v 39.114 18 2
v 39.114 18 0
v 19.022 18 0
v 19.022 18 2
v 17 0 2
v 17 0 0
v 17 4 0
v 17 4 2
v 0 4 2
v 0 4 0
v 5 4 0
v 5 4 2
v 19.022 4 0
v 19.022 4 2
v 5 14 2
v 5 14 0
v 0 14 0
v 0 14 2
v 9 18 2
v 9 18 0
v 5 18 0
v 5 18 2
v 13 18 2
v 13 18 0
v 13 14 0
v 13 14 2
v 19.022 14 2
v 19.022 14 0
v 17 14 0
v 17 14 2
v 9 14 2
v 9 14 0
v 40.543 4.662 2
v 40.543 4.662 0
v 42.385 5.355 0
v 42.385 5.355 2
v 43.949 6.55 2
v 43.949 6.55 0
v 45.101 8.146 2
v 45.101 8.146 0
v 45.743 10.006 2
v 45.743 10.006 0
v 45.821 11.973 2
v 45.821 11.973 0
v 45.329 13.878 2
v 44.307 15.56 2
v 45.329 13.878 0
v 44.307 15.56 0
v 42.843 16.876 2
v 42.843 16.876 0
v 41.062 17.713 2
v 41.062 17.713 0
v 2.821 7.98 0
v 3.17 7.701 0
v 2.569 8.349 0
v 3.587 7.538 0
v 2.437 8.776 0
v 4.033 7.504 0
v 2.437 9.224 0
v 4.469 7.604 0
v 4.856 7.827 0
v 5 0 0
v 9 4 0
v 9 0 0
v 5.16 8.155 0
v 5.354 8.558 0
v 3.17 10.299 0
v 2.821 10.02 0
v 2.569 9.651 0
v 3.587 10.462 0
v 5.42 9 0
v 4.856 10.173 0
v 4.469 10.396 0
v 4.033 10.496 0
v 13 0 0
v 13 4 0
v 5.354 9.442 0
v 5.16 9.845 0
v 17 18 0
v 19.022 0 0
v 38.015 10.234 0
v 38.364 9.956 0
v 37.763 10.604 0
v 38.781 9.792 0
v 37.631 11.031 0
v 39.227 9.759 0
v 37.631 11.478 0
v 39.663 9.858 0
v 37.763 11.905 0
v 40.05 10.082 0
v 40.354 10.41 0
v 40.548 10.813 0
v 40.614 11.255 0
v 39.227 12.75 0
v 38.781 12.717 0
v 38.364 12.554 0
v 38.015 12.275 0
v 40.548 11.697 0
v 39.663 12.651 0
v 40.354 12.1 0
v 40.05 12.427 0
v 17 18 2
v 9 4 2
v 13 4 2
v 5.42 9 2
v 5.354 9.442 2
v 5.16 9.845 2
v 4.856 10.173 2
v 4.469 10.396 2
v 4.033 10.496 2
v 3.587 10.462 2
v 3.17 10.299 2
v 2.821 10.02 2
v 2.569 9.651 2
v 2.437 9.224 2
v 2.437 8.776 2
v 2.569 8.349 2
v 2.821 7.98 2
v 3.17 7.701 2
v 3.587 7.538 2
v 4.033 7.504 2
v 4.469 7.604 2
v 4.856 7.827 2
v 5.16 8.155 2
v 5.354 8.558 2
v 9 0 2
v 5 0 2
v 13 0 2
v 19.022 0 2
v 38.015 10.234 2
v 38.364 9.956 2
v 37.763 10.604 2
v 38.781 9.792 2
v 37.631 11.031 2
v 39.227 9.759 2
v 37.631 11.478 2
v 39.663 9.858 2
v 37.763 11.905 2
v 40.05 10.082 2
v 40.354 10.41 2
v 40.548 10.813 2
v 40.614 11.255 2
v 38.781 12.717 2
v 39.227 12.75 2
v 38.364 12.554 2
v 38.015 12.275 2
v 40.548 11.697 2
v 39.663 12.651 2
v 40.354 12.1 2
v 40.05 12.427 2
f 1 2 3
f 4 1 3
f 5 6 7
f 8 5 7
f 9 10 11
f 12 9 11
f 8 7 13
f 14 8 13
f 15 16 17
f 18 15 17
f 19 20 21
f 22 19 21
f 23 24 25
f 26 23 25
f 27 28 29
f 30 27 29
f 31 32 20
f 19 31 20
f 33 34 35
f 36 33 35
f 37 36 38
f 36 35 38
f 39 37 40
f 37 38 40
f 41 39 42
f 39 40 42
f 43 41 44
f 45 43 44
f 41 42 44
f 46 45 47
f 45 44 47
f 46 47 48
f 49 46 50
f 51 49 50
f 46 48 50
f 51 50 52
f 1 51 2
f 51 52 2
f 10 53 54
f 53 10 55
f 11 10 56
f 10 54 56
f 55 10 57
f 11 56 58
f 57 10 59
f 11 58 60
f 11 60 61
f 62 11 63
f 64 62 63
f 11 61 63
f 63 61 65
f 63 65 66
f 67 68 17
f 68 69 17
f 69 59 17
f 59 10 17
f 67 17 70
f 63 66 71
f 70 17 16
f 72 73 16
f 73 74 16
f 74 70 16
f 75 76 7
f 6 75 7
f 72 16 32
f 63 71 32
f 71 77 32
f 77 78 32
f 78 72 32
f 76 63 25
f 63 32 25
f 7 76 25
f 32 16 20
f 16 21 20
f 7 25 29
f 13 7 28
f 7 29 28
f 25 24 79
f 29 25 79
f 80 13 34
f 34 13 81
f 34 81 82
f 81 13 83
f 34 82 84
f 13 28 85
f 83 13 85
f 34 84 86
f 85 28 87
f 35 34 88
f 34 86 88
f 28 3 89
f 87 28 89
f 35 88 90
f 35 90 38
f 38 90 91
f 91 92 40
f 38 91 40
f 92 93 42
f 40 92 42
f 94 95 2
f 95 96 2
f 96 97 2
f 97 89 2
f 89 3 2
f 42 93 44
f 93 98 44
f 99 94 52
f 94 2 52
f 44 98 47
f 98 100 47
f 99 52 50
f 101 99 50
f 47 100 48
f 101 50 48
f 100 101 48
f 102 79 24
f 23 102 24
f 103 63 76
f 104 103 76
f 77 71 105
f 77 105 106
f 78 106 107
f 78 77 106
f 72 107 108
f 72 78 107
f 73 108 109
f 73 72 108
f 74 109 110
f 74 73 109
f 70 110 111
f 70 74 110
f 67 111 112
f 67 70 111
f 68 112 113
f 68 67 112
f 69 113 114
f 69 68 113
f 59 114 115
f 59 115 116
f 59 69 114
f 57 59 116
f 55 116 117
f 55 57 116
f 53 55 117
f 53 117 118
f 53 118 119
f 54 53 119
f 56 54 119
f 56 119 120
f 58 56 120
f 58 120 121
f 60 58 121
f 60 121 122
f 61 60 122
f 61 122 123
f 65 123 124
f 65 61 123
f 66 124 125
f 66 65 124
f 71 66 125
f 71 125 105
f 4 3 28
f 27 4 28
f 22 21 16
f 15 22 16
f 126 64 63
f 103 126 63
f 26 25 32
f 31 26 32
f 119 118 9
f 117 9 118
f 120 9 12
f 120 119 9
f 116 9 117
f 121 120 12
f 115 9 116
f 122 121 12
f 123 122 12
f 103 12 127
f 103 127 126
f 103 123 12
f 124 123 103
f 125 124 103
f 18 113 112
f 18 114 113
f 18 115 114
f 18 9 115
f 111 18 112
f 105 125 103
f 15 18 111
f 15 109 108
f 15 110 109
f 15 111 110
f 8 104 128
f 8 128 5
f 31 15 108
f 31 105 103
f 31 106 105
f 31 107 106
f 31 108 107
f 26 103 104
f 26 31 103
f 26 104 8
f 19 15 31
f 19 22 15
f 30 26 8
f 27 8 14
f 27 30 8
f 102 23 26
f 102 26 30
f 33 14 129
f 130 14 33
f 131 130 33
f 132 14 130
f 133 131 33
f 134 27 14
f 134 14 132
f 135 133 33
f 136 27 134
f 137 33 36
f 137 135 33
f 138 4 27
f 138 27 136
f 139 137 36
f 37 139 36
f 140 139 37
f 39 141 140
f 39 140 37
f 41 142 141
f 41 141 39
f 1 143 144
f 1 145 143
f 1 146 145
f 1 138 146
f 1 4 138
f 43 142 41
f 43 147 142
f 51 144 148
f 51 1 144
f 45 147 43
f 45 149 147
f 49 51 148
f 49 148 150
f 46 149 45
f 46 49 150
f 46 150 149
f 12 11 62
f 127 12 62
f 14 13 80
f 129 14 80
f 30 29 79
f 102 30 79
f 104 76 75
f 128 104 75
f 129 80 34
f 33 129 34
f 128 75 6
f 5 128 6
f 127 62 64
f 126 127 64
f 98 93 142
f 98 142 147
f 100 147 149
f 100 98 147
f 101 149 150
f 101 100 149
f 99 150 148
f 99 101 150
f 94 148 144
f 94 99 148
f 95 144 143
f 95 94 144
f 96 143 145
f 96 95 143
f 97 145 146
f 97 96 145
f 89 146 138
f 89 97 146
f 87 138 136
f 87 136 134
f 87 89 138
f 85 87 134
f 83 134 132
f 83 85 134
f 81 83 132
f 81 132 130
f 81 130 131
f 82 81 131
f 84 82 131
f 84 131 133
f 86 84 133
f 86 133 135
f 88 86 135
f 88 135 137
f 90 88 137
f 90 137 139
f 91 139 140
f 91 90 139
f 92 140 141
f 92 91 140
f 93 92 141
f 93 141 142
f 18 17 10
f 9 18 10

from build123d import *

# Parameters (mm, degrees)
SKETCH1_R           = 1.5
BOSS_EXTRUDE1_DEPTH = 2


with BuildPart() as part:
    # Sketch1 → Boss-Extrude1 (new body)
    with BuildSketch(Plane.XY):
        with BuildLine():
            Line((19.021561934, 0), (40.542646089, 4.662222335))
            ThreePointArc((40.542646089, 4.662222335), (45.821499943, 11.972802233), (39.114495851, 17.999988357))
            Line((39.114495851, 17.999988357), (19.021561934, 17.999988357))
            Line((19.021561934, 17.999988357), (19.021561934, 13.999988357))
            Line((19.021561934, 13.999988357), (17, 13.999988357))
            Line((17, 13.999988357), (17, 17.999988357))
            Line((17, 17.999988357), (13, 17.999988357))
            Line((13, 17.999988357), (13, 13.999988357))
            Line((13, 13.999988357), (9, 13.999988357))
            Line((9, 13.999988357), (9, 17.999988357))
            Line((9, 17.999988357), (5, 17.999988357))
            Line((5, 17.999988357), (5, 13.999988357))
            Line((5, 13.999988357), (0, 13.999988357))
            Line((0, 13.999988357), (0, 4))
            Line((0, 4), (5, 4))
            Line((5, 4), (5, 0))
            Line((5, 0), (9, 0))
            Line((9, 0), (9, 4))
            Line((9, 4), (13, 4))
            Line((13, 4), (13, 0))
            Line((13, 0), (17, 0))
            Line((17, 0), (17, 4))
            Line((17, 4), (19.021561934, 4))
            Line((19.021561934, 4), (19.021561934, 0))
        make_face()
        with Locations((39.114495851, 11.254645274)):
            Circle(SKETCH1_R, mode=Mode.SUBTRACT)
        with Locations((3.920490093, 8.999988357)):
            Circle(SKETCH1_R, mode=Mode.SUBTRACT)
    extrude(amount=BOSS_EXTRUDE1_DEPTH)


solid = part.part
